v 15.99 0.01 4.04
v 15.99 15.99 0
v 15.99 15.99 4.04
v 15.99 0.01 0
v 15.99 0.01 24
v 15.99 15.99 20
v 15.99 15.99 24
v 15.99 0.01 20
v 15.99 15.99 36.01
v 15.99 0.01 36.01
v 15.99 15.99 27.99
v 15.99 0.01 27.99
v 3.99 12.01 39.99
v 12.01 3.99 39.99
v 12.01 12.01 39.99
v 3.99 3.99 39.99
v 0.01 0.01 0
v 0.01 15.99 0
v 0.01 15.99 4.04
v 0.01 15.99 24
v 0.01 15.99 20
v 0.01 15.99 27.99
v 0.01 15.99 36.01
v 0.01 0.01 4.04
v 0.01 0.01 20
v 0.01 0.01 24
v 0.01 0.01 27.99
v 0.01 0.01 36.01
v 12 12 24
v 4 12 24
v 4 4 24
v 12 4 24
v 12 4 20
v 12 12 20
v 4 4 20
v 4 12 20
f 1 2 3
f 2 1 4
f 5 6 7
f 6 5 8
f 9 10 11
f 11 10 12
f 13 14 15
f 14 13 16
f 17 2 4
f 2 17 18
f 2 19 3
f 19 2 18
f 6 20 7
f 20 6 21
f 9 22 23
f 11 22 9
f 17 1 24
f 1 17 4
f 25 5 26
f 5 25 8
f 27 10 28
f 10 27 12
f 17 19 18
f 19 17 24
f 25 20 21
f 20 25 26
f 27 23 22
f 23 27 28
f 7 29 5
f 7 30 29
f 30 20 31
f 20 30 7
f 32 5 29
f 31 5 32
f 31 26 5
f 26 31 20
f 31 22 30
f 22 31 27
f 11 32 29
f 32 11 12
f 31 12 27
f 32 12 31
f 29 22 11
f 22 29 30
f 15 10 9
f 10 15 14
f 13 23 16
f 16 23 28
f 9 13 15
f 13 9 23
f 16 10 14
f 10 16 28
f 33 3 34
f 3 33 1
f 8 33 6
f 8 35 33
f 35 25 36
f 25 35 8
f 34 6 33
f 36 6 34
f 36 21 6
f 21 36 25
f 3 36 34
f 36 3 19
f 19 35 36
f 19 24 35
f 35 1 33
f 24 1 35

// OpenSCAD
difference () {
cube([15.99,15.99,39.99]);
//Creation of the top cut
translate([0,0,40])
	cube([16,16,.1]);


translate([0,0,0])
	cube([16,.01, 40]);
translate([0,16,0])
	cube([16,.01, 40]);
translate([0,0,0])
	cube([.01,16, 40]);
translate([16,0,0])
	cube([.01,16, 40]);

translate([0,16,24])
	rotate([90,0,0])
	linear_extrude(height =16, center = false, convexity = 10, twist = 0)
	polygon([[0,0],[4,0],[0,4]],[[0,1,2]]);
translate([16,0,24])
	rotate([90,0,180])
	linear_extrude(height =16, center = false, convexity = 10, twist = 0)
	polygon([[0,0],[4,0],[0,4]],[[0,1,2]]);
translate([0,0,24])
	rotate([90,0,90])
	linear_extrude(height =16, center = false, convexity = 10, twist = 0)
	polygon([[0,0],[4,0],[0,4]],[[0,1,2]]);
translate([16,16,24])
	rotate([90,0,270])
	linear_extrude(height =16, center = false, convexity = 10, twist = 0)
	polygon([[0,0],[4,0],[0,4]],[[0,1,2]]);

//Top Cuts
translate([16,16,40])
	rotate([90,180,0])
	linear_extrude(height =16, center = false, convexity = 10, twist = 0)
	polygon([[0,0],[4,0],[0,4]],[[0,1,2]]);
translate([0,0,40])
	rotate([90,180,180])
	linear_extrude(height =16, center = false, convexity = 10, twist = 0)
	polygon([[0,0],[4,0],[0,4]],[[0,1,2]]);
translate([0,16,40])
	rotate([90,180,90])
	linear_extrude(height =16, center = false, convexity = 10, twist = 0)
	polygon([[0,0],[4,0],[0,4]],[[0,1,2]]);
translate([16,0,40])
	rotate([90,180,270])
	linear_extrude(height =16, center = false, convexity = 10, twist = 0)
	polygon([[0,0],[4,0],[0,4]],[[0,1,2]]);



//Creation of the bottom Cut
translate([16,16,20])
	rotate([90,180,0])
	linear_extrude(height =16, center = false, convexity = 10, twist = 0)
	polygon([[0,16],[0,0],[4,0]],[[0,1,2]]);
translate([0,16,20])
	rotate([90,180,90])
	linear_extrude(height =16, center = false, convexity = 10, twist = 0)
	polygon([[0,16],[0,0],[4,0]],[[0,1,2]]);
translate([0,0,20])
	rotate([90,180,180])
	linear_extrude(height =16, center = false, convexity = 10, twist = 0)
	polygon([[0,16],[0,0],[4,0]],[[0,1,2]]);
translate([16,0,20])
	rotate([90,180,270])
	linear_extrude(height =16, center = false, convexity = 10, twist = 0)
	polygon([[0,16],[0,0],[4,0]],[[0,1,2]]);	
}
